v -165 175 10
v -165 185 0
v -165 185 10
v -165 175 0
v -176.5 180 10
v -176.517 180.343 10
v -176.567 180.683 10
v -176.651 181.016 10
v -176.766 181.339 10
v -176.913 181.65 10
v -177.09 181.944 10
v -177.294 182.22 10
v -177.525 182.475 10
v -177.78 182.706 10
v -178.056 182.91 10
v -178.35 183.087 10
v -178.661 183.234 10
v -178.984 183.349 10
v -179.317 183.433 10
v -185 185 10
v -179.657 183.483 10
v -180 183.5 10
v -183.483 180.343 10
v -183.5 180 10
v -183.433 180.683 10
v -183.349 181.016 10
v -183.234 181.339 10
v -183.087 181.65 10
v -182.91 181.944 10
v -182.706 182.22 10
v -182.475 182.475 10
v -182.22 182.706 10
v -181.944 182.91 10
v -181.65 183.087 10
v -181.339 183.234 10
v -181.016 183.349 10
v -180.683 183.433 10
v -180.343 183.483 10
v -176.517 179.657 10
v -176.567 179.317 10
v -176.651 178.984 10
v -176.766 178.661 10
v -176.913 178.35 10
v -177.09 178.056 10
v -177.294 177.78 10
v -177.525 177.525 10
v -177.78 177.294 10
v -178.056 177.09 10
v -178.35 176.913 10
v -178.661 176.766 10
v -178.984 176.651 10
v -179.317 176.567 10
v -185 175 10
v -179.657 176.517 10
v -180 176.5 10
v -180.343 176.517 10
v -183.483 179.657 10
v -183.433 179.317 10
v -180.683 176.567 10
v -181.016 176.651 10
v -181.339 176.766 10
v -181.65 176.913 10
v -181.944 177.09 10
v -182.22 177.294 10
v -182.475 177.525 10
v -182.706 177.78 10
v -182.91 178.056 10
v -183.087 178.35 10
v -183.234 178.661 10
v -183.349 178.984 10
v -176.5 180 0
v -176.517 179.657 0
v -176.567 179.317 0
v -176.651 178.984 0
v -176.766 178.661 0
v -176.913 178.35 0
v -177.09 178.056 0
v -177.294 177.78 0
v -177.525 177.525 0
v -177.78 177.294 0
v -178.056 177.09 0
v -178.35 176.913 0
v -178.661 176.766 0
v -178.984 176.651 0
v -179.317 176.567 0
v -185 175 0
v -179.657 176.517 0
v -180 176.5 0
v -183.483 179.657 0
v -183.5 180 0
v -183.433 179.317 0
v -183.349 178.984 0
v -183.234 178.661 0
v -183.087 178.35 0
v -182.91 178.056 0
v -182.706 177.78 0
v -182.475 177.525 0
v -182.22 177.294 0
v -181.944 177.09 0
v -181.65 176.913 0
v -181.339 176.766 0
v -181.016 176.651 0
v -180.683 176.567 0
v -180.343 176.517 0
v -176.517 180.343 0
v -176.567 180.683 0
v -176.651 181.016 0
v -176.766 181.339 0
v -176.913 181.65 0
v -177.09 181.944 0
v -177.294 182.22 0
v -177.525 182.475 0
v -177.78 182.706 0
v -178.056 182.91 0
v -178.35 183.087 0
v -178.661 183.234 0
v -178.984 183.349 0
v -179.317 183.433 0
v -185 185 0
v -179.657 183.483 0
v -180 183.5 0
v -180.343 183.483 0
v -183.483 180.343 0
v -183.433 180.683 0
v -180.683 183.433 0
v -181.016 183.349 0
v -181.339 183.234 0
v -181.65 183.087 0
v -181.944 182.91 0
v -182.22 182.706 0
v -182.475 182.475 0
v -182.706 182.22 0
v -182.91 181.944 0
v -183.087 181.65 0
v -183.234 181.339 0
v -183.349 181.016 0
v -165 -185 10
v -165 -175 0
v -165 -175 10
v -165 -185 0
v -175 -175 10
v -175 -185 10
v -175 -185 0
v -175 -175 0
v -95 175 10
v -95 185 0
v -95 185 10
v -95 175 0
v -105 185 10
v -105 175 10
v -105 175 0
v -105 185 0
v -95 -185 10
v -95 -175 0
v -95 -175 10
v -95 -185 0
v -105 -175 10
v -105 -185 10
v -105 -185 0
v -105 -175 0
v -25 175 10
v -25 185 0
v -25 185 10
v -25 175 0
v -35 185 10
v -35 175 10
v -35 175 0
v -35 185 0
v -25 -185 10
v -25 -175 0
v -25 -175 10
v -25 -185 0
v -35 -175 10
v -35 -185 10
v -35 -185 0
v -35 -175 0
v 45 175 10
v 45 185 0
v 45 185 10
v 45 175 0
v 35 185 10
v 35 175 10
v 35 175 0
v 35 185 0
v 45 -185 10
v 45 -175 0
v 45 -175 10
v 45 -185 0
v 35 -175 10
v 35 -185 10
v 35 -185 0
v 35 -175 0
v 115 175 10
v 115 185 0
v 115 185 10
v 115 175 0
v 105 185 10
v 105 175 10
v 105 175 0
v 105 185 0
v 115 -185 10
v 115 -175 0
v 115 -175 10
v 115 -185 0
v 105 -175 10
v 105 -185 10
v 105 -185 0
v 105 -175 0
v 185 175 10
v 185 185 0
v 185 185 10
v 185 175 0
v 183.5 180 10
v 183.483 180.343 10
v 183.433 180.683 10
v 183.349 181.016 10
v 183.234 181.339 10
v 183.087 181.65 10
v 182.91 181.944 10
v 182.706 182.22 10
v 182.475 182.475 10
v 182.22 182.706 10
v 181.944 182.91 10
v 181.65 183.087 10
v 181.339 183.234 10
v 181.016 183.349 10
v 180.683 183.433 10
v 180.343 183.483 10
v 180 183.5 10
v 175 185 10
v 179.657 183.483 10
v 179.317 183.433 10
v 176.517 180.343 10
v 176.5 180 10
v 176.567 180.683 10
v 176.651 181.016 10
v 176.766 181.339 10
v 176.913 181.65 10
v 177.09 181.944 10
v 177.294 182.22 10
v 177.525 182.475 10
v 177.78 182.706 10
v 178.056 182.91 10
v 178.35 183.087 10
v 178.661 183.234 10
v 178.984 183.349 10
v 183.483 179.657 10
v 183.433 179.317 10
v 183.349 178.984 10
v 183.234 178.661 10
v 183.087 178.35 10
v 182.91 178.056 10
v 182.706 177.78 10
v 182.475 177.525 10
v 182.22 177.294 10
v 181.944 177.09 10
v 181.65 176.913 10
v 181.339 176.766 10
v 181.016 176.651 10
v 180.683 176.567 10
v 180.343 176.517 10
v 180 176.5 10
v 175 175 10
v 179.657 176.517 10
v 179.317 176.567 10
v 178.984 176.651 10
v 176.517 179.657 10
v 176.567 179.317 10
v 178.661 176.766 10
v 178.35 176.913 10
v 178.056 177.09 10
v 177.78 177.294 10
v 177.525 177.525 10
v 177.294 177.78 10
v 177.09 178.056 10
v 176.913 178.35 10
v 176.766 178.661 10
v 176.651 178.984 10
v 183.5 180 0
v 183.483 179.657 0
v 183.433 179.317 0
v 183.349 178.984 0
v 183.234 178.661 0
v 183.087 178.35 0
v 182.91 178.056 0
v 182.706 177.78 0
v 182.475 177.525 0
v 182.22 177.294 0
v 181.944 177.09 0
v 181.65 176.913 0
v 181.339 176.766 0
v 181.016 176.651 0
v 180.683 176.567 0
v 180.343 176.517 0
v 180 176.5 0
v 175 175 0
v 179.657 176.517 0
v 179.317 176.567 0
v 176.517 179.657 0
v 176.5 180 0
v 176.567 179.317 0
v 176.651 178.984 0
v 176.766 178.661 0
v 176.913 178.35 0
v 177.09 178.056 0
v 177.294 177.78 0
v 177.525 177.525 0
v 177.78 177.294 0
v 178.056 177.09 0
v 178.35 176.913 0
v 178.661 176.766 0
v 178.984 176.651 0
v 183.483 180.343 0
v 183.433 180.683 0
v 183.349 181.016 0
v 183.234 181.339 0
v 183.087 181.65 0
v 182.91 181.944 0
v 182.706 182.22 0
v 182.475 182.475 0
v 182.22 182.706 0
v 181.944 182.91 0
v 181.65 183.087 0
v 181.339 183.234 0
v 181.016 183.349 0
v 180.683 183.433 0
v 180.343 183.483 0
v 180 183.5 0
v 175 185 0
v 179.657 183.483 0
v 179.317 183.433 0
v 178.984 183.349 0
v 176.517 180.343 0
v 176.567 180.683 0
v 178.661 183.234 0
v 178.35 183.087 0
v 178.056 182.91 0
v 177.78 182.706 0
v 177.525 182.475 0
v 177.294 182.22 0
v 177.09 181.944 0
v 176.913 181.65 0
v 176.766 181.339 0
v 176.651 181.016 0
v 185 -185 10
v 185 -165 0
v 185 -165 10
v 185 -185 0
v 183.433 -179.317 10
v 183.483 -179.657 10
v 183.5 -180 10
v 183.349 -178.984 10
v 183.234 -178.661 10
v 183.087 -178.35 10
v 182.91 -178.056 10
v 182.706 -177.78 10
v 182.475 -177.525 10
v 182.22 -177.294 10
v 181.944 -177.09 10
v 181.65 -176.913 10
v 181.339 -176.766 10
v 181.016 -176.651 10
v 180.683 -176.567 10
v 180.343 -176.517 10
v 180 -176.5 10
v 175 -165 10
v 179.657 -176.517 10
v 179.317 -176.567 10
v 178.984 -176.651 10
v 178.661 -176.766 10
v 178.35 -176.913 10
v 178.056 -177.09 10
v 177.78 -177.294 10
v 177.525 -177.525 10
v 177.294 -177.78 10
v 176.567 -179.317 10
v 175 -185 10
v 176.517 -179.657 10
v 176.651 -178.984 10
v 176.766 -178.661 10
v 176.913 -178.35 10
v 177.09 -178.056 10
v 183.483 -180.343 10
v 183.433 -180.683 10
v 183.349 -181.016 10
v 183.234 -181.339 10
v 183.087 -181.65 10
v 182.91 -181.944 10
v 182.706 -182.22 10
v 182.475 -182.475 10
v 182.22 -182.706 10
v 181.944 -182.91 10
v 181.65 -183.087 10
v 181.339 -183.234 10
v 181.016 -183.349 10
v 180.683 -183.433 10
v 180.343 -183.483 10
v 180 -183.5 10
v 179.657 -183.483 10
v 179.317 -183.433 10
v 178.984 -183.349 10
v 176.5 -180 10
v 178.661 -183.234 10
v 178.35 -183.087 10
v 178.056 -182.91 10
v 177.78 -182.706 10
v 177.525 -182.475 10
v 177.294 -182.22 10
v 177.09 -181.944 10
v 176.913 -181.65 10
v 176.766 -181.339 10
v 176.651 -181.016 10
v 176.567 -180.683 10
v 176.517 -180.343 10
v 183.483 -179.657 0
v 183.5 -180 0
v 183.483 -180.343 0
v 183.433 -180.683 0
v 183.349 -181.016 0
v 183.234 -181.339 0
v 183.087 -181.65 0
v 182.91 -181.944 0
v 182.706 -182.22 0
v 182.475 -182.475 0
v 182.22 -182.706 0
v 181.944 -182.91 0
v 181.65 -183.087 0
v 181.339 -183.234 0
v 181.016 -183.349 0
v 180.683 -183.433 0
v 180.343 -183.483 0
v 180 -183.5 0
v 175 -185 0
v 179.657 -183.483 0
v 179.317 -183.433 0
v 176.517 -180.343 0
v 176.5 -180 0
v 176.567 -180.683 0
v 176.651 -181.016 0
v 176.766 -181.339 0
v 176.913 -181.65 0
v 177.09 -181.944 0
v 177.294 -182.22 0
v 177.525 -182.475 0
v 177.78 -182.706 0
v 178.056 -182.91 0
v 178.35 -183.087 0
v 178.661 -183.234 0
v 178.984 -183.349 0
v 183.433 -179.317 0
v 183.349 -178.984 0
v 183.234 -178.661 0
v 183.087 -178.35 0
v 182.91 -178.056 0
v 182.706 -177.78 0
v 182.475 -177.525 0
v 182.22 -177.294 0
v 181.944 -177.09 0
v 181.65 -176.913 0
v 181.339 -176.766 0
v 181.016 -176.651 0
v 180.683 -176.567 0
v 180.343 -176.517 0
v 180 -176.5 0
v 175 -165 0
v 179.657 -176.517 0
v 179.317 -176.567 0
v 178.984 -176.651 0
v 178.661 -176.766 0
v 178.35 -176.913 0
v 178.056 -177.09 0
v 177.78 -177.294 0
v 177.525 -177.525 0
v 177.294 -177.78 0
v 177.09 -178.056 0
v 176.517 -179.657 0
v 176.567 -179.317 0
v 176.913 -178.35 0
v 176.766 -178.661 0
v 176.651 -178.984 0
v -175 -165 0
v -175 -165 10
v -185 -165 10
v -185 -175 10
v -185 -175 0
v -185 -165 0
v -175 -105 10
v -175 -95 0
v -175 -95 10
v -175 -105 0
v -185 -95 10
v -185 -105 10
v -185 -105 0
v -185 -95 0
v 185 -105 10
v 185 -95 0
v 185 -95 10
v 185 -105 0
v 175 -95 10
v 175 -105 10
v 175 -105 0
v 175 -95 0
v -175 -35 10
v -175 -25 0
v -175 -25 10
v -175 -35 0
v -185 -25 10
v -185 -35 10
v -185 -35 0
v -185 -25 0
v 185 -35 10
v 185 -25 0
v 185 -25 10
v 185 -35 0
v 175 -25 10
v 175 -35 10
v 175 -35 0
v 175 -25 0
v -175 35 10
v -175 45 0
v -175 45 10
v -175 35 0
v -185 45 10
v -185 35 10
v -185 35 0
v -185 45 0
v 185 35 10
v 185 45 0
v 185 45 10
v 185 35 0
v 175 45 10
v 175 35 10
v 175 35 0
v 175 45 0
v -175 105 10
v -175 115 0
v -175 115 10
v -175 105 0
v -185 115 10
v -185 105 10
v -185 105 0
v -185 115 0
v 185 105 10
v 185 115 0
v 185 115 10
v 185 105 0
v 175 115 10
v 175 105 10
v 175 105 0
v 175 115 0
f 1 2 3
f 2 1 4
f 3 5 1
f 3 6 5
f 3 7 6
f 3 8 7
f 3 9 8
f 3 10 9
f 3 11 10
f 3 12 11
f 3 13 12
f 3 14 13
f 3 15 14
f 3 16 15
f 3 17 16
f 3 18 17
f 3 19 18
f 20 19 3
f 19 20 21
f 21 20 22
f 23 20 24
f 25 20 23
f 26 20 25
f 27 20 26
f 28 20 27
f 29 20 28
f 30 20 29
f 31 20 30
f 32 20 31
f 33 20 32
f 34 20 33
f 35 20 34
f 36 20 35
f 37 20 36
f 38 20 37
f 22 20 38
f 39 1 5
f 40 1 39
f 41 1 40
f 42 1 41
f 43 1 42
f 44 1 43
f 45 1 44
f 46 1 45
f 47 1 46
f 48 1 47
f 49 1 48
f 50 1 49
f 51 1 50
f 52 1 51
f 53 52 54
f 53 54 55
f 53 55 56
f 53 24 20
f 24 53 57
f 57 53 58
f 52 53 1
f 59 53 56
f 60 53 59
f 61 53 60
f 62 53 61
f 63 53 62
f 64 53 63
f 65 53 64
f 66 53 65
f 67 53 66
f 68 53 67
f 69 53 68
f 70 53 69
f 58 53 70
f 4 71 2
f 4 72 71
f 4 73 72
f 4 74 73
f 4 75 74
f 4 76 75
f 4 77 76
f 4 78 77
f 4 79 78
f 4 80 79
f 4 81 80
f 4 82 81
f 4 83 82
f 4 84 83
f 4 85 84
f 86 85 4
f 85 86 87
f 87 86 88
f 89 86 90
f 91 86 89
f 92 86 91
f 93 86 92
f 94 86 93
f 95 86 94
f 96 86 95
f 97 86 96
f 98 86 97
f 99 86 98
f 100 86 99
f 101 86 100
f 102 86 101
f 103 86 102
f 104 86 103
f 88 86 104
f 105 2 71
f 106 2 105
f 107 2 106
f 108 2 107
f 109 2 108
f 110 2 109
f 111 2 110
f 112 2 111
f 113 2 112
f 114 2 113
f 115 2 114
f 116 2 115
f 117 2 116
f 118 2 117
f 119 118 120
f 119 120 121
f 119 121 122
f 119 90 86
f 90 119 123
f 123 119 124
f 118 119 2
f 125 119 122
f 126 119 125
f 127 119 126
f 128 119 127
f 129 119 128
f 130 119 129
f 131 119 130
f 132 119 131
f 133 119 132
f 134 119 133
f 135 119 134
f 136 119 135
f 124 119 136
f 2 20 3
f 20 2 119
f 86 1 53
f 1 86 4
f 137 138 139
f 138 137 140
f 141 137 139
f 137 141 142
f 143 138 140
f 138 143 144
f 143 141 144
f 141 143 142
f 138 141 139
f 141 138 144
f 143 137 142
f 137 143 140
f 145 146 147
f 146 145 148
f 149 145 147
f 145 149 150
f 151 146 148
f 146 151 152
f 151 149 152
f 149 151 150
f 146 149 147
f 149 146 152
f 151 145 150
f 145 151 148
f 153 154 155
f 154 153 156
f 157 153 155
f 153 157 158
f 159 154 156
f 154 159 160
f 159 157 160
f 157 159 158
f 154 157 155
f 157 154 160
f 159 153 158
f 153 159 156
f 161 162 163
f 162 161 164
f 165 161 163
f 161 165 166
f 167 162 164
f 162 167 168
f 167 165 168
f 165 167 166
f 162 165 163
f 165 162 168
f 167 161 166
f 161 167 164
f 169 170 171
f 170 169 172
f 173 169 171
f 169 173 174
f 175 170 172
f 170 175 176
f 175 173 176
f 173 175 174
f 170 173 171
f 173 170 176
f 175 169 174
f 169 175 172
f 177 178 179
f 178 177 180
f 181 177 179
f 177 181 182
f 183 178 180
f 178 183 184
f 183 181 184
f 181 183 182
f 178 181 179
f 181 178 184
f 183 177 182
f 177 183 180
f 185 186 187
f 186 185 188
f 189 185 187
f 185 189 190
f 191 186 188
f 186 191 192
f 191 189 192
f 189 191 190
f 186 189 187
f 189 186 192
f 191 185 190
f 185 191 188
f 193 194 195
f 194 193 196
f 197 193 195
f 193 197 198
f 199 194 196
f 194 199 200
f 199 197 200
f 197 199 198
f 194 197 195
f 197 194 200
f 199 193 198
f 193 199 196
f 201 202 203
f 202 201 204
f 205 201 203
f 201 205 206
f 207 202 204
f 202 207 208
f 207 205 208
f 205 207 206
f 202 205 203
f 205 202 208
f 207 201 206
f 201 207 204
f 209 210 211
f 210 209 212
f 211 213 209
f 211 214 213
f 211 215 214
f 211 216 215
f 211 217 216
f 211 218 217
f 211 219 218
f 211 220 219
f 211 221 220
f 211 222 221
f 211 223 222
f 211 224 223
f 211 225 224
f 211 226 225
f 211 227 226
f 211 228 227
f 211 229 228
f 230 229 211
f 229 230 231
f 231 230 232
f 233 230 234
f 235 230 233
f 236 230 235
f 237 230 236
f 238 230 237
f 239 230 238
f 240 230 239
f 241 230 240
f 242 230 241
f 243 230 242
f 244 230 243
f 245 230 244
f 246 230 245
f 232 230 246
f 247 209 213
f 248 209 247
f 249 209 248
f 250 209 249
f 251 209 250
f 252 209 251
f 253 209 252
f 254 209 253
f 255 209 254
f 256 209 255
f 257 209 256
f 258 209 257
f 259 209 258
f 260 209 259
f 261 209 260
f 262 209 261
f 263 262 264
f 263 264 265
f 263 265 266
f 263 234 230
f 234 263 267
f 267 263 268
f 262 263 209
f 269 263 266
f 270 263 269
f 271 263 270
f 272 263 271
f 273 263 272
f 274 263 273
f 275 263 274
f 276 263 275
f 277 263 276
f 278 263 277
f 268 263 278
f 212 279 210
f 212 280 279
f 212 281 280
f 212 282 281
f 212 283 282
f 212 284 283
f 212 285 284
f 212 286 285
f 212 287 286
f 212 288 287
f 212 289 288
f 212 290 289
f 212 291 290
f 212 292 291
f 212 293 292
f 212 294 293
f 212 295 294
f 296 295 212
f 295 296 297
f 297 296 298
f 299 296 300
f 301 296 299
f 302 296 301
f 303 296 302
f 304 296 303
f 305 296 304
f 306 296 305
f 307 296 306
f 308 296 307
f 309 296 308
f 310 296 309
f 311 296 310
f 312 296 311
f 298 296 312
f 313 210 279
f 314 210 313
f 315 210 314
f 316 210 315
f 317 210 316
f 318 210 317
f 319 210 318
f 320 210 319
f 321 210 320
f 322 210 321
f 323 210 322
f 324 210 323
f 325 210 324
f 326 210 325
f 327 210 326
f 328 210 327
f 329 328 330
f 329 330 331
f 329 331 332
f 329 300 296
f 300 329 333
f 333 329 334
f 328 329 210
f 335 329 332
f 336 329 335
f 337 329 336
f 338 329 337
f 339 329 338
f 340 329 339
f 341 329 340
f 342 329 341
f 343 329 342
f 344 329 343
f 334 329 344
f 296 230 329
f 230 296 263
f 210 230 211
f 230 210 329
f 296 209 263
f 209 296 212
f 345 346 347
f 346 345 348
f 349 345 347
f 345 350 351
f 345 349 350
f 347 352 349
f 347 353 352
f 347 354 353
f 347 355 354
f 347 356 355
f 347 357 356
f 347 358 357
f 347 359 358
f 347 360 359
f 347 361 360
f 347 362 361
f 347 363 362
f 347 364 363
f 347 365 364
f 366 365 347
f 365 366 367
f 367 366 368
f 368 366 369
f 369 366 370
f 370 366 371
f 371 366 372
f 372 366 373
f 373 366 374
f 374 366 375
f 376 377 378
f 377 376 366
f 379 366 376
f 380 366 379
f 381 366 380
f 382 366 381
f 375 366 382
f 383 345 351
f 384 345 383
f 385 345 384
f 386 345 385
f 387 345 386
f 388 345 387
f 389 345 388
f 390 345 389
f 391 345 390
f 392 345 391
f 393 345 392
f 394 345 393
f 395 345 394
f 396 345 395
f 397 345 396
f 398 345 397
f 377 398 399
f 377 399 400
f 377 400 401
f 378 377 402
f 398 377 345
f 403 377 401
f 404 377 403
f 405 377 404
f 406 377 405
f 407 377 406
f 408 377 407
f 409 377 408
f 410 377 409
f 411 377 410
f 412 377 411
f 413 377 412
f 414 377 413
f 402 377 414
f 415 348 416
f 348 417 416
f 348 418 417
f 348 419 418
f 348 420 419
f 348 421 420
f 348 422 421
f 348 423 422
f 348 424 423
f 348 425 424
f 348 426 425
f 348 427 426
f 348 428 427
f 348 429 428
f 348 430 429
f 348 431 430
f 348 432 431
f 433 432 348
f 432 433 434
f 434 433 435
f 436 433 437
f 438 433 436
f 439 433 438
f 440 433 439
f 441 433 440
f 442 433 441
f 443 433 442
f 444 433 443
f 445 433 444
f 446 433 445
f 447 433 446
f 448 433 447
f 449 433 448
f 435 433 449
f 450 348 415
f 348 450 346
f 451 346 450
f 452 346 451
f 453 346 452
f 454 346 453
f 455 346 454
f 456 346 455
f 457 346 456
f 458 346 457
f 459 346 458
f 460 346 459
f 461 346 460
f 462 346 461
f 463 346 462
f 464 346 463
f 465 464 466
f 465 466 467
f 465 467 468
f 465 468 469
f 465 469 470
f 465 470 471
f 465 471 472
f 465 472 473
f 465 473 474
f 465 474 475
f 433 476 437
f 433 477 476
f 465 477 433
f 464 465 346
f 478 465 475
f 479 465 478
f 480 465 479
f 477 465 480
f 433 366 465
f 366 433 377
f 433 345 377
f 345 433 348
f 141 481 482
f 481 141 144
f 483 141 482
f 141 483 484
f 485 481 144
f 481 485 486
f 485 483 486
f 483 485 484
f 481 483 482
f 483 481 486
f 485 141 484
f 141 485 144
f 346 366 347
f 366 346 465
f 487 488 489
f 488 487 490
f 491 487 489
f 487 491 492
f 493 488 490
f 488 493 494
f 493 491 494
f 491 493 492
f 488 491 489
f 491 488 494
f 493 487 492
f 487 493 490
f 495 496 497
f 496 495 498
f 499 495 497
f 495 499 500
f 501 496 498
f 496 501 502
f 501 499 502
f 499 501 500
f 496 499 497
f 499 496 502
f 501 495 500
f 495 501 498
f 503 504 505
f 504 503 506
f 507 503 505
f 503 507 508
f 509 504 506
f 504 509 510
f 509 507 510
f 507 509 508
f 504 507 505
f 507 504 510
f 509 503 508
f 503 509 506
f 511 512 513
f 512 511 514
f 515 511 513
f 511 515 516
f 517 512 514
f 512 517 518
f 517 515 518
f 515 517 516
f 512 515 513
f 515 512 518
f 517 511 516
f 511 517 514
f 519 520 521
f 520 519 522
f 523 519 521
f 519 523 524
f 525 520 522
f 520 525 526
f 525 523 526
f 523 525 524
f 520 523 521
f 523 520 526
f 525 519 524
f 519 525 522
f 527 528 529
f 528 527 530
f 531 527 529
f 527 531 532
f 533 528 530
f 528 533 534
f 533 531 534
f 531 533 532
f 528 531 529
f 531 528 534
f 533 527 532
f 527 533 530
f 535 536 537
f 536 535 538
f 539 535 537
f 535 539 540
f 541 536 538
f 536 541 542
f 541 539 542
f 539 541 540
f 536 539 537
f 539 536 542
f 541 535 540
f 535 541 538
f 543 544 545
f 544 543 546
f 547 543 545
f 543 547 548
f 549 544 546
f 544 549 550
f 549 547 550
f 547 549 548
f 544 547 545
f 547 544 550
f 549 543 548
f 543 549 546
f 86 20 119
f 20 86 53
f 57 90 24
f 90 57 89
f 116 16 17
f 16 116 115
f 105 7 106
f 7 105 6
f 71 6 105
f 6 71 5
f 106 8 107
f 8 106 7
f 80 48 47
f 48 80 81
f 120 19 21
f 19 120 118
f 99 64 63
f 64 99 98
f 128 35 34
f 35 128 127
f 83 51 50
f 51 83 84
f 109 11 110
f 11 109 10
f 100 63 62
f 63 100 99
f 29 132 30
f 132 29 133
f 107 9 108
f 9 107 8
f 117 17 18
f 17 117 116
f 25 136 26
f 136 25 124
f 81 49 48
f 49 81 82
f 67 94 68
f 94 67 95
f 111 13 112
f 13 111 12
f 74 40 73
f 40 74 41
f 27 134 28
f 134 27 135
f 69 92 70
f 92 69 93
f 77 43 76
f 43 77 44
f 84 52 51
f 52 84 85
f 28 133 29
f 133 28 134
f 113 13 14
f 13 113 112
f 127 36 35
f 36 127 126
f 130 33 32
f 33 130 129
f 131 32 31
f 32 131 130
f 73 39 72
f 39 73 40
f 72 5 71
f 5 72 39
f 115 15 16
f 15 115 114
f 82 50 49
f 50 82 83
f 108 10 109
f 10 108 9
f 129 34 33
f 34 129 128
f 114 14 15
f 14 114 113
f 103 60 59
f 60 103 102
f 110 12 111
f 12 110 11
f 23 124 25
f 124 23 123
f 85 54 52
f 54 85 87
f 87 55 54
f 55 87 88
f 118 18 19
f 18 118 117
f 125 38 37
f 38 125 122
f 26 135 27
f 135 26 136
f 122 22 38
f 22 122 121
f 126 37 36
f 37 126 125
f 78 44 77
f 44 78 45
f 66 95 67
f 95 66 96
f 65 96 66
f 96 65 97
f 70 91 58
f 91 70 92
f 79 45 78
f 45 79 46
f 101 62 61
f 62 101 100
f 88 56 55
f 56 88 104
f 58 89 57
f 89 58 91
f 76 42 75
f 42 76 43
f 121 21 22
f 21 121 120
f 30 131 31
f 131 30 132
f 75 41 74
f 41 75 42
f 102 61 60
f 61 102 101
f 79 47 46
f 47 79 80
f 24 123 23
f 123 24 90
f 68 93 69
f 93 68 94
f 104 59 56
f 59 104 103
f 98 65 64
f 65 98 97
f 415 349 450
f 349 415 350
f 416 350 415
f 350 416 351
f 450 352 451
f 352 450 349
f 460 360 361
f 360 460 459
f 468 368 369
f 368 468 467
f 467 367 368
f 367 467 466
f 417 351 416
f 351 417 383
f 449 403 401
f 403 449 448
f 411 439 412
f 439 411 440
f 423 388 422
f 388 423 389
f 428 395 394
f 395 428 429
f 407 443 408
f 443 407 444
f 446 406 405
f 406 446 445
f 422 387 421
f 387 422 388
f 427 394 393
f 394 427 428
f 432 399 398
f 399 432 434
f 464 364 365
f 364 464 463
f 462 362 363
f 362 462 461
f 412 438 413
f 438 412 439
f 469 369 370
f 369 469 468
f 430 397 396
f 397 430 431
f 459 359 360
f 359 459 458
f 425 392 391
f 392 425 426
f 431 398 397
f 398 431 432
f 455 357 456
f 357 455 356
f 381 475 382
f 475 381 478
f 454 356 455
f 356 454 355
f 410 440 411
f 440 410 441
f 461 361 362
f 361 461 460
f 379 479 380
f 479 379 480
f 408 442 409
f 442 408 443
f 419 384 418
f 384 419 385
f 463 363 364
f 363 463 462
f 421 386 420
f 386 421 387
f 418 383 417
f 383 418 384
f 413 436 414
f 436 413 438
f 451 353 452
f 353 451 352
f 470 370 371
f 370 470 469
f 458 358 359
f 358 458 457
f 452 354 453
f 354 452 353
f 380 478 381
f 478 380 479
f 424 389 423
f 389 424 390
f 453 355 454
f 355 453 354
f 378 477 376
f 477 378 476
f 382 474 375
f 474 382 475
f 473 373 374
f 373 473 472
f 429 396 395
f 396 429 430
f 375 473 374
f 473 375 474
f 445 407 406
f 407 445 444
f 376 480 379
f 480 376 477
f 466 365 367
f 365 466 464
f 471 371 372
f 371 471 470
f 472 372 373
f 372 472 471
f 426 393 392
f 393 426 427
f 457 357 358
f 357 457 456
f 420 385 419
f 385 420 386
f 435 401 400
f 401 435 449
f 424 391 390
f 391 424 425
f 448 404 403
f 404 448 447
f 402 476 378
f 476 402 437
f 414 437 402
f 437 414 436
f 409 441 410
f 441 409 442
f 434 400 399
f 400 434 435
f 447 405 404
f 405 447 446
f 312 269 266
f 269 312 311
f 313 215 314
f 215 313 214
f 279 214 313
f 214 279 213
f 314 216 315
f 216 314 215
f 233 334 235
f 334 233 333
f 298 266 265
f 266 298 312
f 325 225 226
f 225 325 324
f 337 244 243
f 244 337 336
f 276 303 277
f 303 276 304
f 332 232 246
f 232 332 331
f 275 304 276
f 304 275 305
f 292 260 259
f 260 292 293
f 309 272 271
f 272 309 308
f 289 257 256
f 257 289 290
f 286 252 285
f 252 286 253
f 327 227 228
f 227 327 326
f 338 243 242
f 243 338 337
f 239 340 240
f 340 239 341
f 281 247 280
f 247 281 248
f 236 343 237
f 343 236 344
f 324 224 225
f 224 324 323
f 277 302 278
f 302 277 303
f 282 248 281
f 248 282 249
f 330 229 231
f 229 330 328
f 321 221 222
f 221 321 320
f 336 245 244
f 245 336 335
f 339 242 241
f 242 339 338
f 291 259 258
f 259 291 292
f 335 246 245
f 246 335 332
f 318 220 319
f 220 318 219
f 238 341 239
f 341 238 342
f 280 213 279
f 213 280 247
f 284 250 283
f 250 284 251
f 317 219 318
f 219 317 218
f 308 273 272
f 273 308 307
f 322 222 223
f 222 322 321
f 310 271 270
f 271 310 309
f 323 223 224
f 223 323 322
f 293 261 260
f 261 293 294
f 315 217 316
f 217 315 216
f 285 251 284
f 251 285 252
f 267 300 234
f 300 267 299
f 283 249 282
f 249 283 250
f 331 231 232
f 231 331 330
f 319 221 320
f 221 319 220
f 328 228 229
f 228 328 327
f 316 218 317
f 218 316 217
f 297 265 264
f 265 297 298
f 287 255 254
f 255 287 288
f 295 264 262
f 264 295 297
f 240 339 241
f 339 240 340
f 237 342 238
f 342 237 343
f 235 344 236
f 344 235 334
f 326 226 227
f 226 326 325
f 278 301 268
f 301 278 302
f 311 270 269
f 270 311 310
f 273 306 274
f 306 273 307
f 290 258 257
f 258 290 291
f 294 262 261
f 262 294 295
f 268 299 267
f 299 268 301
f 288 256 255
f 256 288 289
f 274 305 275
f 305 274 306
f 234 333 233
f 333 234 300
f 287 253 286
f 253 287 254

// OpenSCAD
// ring_16.scad - ring index 16 (z bottom = 160 mm)
$fn = 64; bar = 10; half_b = bar/2; outer = 370; half_outer = outer/2;
front_y = 180; back_y = -180; left_x = -180; right_x = 180;
x_centers = [-170, -100, -30, 40, 110, 180];
z_centers = [5, 85, 155, 225, 295, 365, 435, 505, 575, 645, 715]; ring_z = 160;
module place_box(cx, cy, sx, sy) { translate([cx - sx/2, cy - sy/2, 0]) cube([sx, sy, bar]); }

difference() { union() {
    for (x = x_centers) { place_box(x, front_y, bar, bar); place_box(x, back_y, bar, bar); }
    for (y = x_centers) { place_box(left_x, y, bar, bar); place_box(right_x, y, bar, bar); }
    for (zc = z_centers) if ((zc - half_b < ring_z + bar) && (zc + half_b > ring_z)) {
        translate([-half_outer, front_y - half_b, 0]) cube([outer, bar, bar]);
        translate([-half_outer, back_y - half_b, 0])  cube([outer, bar, bar]);
        translate([left_x - half_b, -half_outer, 0])  cube([bar, outer, bar]);
        translate([right_x - half_b, -half_outer, 0]) cube([bar, outer, bar]);
    }
  }
  for (cx = [-180, 180]) for (cy = [-180, 180]) translate([cx, cy, 0]) cylinder(h = bar, r = 3.5, $fn = 64);
}
